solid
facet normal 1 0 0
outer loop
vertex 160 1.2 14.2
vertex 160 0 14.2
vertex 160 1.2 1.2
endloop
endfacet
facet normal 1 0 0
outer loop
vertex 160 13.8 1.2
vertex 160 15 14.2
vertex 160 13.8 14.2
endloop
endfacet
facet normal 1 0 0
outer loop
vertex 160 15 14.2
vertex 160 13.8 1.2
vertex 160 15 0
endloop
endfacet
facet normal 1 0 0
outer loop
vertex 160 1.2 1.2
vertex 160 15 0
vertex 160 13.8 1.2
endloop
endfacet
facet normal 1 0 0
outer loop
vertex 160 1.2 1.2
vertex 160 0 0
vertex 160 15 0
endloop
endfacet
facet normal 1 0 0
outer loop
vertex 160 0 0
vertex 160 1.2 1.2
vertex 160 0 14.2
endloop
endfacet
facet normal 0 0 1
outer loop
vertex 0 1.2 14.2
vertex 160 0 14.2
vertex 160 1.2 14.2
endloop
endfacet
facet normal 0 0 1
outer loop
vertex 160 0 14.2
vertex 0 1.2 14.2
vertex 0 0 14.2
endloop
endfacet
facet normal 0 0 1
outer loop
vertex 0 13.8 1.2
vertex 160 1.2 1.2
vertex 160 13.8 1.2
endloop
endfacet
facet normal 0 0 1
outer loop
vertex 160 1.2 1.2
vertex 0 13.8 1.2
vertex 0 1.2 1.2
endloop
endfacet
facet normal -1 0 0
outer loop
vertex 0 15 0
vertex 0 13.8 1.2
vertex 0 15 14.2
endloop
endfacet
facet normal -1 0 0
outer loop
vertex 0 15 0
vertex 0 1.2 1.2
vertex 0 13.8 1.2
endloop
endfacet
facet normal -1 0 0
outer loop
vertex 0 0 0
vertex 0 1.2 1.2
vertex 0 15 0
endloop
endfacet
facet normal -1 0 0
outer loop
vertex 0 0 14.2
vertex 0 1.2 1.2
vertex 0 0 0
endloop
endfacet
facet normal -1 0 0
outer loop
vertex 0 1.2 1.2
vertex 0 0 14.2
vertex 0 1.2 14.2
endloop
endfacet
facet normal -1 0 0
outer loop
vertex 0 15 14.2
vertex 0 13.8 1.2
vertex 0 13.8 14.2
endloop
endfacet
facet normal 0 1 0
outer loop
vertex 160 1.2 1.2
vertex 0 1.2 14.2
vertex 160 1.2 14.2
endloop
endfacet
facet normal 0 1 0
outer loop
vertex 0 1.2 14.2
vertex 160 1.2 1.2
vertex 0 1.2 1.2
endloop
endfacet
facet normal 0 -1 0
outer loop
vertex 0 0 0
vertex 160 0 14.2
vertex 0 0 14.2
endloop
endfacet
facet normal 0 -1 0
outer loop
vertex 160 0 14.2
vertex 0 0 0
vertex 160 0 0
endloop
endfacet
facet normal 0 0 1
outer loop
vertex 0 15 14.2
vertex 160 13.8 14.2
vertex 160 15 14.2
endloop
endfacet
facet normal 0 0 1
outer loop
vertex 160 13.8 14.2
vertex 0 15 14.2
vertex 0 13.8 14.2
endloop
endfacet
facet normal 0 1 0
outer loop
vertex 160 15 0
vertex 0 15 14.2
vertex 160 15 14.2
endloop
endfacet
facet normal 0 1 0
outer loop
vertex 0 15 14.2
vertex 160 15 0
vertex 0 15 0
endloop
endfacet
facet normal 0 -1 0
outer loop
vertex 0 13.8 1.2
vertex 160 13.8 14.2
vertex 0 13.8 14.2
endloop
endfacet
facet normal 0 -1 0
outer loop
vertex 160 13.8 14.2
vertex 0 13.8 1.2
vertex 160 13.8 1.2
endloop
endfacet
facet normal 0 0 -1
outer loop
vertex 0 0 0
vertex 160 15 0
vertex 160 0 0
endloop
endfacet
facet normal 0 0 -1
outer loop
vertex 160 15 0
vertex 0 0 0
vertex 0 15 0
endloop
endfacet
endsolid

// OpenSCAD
// ScienceClaw nominal U-channel. All dimensions in millimeters.
// Clamp the first clamp_length along x. No holes or clamp reinforcement.
// Print parameters, layer orientation, material batch, and actual dimensions
// must be recorded separately; this file does not prescribe a qualified process.
length = 160;
clamp_length = 25;
base_width = 15;
wall_height = 13;
thickness = 1.2;
assert(length > clamp_length && clamp_length > 0);
assert(base_width > 2 * thickness && thickness > 0 && wall_height >= 0);
union() {
    cube([length, base_width, thickness]);
    if (wall_height > 0) {
        translate([0, 0, thickness]) cube([length, thickness, wall_height]);
        translate([0, base_width - thickness, thickness]) cube([length, thickness, wall_height]);
    }
}
